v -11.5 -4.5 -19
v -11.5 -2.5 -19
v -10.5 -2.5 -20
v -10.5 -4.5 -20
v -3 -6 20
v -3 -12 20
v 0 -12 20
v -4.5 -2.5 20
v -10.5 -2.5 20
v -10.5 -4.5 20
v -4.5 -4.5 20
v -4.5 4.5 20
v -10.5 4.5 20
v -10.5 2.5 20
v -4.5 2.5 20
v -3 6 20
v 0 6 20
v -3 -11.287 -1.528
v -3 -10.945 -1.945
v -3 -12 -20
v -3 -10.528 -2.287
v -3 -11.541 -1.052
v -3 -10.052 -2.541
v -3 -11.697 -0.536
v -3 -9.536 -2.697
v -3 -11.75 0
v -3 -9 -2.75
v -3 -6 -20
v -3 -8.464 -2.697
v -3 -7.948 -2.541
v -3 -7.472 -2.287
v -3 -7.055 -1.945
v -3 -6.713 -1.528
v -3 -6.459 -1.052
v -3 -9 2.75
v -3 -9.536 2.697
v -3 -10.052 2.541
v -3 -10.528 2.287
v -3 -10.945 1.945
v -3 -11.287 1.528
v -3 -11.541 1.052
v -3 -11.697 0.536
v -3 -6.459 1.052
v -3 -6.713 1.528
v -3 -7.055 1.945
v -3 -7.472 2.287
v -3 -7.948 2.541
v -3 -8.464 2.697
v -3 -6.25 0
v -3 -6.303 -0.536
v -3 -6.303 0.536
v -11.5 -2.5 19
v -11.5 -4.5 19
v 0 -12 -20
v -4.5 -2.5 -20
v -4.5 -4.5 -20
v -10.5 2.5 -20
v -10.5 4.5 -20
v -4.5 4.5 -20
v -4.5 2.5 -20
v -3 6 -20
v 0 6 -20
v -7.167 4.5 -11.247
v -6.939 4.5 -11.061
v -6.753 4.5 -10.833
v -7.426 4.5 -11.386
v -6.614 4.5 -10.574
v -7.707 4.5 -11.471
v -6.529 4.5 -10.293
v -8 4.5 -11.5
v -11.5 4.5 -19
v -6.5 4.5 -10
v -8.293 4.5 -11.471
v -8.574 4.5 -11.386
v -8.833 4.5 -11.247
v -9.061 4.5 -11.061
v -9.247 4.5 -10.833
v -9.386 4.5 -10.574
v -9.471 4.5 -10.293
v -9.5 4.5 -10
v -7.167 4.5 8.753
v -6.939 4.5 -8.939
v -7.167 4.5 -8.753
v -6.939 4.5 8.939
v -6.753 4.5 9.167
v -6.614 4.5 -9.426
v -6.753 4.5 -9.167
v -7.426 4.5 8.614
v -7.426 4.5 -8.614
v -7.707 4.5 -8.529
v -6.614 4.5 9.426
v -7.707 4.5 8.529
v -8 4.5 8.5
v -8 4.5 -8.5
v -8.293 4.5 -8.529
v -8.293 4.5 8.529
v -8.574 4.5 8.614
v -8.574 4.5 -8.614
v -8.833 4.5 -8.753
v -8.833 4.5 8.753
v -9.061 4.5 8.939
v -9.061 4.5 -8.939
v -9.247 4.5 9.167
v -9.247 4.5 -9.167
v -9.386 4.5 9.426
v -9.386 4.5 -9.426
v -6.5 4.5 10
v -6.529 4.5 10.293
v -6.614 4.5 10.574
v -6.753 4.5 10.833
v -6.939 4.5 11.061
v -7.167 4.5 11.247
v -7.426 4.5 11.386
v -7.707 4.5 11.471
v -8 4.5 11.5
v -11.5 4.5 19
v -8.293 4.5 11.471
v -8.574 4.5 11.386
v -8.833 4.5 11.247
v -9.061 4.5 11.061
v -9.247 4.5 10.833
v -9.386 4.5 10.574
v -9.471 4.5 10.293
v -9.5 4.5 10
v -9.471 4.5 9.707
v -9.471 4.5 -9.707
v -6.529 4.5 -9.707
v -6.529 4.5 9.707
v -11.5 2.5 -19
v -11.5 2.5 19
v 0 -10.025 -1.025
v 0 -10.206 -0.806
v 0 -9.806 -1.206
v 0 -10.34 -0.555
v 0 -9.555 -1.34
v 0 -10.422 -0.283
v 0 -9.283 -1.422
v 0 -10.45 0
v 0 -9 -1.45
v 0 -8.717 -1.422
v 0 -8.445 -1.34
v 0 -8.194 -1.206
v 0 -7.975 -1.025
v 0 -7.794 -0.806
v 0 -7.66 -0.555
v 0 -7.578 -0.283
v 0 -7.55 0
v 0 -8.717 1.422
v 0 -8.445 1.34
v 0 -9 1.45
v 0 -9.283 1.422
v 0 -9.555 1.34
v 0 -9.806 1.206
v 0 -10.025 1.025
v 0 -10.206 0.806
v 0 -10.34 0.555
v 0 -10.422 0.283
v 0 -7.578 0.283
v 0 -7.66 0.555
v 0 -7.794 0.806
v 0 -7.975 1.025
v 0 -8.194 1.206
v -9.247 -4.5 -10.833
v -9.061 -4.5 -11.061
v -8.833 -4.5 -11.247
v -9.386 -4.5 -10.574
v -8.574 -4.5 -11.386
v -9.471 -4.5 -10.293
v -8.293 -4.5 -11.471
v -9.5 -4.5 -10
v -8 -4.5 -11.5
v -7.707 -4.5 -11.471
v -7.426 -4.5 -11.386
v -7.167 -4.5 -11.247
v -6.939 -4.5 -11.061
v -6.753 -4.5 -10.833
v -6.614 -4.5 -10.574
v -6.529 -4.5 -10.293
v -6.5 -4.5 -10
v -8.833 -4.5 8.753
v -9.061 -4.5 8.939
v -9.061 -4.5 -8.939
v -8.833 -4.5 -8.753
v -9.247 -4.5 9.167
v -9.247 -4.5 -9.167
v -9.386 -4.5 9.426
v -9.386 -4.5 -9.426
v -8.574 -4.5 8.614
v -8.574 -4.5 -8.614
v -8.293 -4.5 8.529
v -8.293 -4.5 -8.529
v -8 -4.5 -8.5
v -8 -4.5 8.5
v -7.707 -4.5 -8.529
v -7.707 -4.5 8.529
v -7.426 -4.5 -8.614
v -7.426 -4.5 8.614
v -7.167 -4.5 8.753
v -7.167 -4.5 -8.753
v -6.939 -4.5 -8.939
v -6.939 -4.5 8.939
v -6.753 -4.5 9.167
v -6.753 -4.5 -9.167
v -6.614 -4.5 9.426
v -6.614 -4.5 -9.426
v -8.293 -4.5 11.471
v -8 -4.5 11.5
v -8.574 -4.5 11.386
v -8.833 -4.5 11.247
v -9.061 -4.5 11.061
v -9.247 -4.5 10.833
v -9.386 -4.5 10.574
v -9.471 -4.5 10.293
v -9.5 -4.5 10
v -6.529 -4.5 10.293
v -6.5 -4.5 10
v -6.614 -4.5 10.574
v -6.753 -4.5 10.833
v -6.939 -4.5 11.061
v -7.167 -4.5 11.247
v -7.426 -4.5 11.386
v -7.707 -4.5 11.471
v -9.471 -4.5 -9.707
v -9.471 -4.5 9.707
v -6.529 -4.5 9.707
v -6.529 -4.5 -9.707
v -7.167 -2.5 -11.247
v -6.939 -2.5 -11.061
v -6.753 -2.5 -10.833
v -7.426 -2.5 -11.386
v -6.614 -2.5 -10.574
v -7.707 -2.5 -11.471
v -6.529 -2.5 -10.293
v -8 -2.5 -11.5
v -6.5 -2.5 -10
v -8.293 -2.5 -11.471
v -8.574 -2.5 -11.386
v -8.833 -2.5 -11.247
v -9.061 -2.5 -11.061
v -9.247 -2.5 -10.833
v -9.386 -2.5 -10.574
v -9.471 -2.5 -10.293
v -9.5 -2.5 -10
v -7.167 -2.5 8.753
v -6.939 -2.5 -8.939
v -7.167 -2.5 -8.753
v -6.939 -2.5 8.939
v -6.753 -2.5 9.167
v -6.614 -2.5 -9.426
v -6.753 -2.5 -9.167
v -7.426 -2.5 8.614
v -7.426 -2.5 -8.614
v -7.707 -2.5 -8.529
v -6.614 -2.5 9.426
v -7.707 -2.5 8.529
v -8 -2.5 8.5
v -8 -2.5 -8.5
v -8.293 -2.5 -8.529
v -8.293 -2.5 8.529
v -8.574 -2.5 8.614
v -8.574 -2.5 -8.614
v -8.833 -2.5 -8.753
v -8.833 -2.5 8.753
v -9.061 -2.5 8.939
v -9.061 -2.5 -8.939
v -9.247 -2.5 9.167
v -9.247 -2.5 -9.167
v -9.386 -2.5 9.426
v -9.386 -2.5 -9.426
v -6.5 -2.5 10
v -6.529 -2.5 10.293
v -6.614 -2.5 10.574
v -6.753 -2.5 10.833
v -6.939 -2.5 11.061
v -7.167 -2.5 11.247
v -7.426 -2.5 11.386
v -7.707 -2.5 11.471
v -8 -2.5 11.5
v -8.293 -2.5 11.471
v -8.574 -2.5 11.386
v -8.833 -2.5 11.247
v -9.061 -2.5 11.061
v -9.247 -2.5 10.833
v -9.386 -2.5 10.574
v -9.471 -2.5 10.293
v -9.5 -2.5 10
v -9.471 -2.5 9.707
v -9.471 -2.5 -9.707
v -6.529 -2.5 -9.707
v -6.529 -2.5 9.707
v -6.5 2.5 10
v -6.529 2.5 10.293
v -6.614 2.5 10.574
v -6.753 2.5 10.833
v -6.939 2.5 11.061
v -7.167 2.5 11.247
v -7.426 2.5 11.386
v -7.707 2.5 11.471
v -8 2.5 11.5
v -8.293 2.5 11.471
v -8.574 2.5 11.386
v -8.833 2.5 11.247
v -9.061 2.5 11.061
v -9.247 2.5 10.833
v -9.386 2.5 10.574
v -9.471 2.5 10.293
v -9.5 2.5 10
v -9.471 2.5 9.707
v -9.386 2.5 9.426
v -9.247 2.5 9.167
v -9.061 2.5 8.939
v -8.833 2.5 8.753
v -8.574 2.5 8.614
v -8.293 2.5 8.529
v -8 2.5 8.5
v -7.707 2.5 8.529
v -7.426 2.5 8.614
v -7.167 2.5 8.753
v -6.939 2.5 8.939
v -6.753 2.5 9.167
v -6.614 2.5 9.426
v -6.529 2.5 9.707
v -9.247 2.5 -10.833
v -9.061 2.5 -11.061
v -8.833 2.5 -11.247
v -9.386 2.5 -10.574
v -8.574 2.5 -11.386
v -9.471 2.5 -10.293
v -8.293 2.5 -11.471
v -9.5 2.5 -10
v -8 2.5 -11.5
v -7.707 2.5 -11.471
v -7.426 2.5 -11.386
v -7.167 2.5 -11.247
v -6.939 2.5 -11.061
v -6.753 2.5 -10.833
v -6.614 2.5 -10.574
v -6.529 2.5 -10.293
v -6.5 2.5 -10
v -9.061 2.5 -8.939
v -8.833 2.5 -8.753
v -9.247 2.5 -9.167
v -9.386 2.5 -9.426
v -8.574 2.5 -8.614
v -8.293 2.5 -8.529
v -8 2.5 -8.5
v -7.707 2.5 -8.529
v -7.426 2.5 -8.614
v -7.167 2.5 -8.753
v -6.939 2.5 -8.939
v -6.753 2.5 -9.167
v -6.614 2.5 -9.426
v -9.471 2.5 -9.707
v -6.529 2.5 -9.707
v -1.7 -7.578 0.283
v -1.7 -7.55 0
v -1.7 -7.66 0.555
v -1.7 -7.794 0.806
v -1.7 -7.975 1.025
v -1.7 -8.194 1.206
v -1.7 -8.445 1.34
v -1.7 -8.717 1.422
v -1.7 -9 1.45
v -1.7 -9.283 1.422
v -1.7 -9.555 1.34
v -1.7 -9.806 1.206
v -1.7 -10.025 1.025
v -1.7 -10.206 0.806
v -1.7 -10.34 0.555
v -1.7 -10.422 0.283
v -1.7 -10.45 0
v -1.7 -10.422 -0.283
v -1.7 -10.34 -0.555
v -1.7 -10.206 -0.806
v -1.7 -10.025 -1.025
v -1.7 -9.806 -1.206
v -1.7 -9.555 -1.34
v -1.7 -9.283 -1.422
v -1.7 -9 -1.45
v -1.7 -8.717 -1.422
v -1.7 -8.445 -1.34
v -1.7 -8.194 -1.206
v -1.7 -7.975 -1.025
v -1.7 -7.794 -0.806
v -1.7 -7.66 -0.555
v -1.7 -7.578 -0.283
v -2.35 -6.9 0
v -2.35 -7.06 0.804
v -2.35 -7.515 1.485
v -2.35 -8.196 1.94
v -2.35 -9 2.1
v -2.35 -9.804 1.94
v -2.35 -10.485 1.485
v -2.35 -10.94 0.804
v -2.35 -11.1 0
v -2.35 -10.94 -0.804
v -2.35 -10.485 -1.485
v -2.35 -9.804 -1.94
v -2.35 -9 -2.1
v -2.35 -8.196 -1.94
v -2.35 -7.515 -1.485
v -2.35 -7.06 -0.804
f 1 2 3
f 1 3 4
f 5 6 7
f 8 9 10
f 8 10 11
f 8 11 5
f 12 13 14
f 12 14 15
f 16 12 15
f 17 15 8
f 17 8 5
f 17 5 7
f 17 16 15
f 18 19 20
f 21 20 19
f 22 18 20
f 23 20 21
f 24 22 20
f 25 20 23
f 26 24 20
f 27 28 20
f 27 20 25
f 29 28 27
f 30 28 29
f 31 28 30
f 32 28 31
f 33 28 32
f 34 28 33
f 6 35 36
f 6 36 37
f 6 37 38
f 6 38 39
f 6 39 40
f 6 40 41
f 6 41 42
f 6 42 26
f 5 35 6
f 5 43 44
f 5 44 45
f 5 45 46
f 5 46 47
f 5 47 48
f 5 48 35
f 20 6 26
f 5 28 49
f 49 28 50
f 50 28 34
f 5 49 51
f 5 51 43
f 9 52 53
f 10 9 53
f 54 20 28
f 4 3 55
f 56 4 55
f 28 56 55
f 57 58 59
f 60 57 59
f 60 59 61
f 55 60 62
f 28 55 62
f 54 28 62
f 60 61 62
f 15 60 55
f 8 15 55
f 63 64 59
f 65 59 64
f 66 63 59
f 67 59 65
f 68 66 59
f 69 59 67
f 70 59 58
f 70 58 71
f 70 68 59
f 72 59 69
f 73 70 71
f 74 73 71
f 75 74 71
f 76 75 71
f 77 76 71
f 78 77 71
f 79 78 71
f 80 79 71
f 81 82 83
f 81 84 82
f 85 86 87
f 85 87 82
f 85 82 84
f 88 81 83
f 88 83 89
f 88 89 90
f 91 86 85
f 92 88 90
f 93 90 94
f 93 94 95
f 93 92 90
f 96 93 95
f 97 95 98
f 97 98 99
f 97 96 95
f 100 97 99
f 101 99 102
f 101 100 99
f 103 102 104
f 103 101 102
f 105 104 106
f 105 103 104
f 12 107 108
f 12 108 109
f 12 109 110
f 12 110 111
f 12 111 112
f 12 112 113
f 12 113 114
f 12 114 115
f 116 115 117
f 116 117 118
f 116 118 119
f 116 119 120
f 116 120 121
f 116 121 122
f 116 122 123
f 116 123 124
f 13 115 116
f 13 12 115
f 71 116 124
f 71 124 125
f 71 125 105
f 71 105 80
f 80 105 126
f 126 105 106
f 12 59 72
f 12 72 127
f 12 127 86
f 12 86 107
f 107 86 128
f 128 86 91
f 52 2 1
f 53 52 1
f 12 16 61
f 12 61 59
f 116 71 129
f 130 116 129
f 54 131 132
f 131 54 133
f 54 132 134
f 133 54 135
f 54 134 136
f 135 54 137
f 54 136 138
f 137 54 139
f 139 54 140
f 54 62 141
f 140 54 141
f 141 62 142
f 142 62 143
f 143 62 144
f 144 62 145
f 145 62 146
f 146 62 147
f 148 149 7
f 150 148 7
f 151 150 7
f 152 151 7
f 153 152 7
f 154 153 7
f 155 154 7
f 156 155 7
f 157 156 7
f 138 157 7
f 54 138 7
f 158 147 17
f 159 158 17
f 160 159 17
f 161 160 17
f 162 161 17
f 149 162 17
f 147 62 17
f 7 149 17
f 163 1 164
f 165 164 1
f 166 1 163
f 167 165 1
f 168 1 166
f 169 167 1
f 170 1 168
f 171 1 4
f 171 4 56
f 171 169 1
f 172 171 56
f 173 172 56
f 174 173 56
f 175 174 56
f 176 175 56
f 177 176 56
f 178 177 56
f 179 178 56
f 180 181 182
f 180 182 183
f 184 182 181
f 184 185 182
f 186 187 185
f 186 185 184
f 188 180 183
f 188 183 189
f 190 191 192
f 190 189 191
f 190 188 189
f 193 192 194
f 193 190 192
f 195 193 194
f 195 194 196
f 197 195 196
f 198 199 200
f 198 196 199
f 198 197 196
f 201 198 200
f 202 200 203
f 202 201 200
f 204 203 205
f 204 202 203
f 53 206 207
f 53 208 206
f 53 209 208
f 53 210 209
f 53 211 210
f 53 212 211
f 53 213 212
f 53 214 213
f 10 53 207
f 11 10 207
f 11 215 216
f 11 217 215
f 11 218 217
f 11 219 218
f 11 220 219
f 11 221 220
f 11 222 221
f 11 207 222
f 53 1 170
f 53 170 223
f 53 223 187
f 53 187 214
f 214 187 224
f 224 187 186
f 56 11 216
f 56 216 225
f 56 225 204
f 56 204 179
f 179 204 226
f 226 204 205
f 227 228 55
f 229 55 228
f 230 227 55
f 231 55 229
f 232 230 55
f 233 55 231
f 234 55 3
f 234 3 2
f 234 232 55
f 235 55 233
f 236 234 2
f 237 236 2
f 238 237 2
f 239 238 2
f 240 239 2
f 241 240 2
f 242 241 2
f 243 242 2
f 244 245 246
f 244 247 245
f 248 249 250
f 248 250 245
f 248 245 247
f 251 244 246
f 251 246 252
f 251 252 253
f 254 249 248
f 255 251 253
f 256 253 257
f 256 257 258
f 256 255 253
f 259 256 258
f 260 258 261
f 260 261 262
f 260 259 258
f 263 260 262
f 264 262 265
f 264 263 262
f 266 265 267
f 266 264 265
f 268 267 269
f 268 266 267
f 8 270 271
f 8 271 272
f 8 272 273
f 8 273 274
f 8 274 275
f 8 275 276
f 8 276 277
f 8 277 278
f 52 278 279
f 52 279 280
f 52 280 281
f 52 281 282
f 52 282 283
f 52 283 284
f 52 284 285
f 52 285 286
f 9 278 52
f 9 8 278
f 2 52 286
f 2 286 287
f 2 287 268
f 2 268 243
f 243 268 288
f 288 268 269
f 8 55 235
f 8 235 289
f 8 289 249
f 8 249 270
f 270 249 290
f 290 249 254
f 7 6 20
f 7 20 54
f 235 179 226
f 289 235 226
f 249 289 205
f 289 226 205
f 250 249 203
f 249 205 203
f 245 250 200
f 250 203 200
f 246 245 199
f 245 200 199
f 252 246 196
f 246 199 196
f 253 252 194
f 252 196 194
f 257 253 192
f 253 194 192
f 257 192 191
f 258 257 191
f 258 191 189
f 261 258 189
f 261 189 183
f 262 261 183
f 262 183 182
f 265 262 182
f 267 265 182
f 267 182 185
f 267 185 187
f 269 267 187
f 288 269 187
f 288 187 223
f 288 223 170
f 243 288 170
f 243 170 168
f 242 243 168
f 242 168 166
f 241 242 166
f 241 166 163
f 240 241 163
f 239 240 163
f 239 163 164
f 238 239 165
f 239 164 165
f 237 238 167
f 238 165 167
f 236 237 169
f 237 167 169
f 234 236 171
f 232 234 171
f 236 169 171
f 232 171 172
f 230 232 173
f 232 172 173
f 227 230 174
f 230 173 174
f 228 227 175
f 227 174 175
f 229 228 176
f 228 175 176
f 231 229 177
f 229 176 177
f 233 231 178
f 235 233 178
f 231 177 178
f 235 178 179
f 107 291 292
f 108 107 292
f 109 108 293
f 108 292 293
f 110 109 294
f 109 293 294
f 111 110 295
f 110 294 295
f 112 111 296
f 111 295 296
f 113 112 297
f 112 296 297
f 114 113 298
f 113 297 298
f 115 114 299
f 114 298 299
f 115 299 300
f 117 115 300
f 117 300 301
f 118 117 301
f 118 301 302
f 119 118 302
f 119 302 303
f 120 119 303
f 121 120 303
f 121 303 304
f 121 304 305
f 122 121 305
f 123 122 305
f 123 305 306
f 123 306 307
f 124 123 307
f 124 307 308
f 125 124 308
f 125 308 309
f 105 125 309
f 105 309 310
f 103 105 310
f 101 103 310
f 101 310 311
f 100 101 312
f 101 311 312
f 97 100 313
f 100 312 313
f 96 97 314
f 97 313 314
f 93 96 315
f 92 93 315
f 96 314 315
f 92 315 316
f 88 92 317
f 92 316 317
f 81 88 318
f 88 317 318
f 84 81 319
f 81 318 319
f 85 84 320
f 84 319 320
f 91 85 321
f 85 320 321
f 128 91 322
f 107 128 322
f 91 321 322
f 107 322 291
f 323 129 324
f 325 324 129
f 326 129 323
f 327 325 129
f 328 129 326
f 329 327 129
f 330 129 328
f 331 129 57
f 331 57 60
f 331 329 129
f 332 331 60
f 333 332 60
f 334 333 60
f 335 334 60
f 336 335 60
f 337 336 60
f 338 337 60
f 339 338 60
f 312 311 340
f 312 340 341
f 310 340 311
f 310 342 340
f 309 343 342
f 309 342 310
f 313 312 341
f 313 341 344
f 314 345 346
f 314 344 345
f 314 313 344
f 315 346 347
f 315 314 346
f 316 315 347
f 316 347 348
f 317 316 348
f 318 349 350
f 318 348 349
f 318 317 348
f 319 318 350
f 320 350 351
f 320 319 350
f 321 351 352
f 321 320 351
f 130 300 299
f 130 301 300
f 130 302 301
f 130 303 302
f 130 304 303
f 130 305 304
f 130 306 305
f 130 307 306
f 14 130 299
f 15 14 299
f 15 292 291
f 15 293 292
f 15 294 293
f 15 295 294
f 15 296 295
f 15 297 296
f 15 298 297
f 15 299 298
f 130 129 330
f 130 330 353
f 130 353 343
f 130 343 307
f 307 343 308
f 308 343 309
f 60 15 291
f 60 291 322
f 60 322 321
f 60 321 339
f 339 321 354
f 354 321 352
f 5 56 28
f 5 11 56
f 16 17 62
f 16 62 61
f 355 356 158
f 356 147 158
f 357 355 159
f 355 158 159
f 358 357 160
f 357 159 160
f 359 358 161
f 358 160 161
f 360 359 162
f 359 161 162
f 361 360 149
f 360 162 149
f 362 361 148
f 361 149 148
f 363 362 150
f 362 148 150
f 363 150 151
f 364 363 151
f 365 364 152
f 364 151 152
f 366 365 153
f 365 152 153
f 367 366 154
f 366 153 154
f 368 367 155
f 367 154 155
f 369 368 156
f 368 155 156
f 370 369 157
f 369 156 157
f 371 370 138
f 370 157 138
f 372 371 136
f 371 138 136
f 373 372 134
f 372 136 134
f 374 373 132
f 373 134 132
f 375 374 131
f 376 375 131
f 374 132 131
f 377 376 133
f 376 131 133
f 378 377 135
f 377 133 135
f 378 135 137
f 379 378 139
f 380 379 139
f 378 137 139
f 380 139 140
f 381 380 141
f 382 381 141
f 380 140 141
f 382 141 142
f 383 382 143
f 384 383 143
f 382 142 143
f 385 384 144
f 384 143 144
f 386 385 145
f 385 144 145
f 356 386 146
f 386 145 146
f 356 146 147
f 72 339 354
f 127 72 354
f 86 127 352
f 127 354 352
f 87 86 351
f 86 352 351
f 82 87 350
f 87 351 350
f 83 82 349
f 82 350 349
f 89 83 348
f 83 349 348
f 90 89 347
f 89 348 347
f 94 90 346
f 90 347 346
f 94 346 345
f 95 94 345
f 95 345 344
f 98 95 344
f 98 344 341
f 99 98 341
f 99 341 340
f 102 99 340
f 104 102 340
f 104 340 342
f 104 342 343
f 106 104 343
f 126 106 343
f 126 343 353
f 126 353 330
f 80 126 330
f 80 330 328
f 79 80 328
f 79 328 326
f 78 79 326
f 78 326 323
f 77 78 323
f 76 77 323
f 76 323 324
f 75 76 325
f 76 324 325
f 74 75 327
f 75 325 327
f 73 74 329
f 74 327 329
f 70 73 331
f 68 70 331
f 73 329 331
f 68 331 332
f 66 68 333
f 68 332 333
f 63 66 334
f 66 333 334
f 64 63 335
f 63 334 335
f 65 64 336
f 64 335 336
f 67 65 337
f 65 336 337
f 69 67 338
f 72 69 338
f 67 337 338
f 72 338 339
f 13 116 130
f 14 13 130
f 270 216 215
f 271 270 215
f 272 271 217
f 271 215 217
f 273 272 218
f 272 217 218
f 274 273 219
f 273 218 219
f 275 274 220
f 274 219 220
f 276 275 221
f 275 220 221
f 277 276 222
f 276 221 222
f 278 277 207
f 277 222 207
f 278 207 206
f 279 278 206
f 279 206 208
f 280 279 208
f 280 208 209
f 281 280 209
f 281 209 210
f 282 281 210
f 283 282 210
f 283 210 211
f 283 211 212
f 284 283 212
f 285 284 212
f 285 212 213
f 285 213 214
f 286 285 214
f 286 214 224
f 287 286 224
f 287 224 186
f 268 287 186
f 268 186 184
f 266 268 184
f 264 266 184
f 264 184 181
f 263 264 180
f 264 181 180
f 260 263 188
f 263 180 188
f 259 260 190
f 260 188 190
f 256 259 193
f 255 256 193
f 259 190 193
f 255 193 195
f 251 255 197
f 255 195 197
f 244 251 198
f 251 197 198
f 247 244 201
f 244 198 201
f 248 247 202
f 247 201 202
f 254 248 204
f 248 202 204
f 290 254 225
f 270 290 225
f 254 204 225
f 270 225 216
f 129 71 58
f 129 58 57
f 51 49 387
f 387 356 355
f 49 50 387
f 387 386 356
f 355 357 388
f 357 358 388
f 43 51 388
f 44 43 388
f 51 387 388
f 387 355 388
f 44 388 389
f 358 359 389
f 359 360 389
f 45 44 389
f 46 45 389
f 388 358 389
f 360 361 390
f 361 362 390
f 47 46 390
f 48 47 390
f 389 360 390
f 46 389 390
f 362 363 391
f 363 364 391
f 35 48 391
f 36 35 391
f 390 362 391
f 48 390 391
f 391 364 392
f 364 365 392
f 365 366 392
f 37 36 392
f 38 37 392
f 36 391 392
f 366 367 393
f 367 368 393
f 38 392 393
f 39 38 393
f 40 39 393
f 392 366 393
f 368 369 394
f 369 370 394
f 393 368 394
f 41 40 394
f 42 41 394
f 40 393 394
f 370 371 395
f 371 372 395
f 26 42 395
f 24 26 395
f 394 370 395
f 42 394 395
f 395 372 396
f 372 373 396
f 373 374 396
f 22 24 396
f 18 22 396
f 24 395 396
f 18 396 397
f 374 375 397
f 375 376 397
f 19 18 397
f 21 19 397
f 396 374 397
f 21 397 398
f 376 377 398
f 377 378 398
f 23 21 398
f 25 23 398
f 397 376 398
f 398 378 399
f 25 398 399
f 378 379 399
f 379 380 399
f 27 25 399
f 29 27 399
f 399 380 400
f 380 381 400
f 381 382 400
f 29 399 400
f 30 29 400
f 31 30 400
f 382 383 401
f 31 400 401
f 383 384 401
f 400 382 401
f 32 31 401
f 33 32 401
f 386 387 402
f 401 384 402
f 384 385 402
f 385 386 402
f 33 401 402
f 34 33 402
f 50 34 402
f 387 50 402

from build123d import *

# Parameters (mm, degrees)
SALIENTE_EXTRUIR1_DEPTH                              = 20
TALADRO_DE_MARGEN_PARA_M31_D                         = 3
CHAFL_N2_SIZE                                        = 1
CROQUIS4_W                                           = 3
CROQUIS4_H                                           = 40
SALIENTE_EXTRUIR2_DEPTH                              = 6
AVELLANADO_PARA_TORNILLO_CON_CABEZA_OVAL_D           = 2.9
AVELLANADO_PARA_TORNILLO_CON_CABEZA_OVAL_CSINK_D     = 5.5
AVELLANADO_PARA_TORNILLO_CON_CABEZA_OVAL_CSINK_ANGLE = 90


with BuildPart() as part:
    # Croquis1 → Saliente-Extruir1 (new, symmetric)
    with BuildSketch(Plane(origin=(0, 0, 0), x_dir=(0, 1, 0), z_dir=(0, 0, 1))):
        Polygon((-6, 0), (6, 0), (6, 3), (4.5, 4.5), (4.5, 11.5), (2.5, 11.5), (2.5, 4.5), (-2.5, 4.5), (-2.5, 11.5), (-4.5, 11.5), (-4.5, 4.5), (-6, 3), align=None)
    extrude(amount=SALIENTE_EXTRUIR1_DEPTH, both=True)

    # Taladro de margen para M31 (through all)
    with Locations(Plane(origin=(0, 4.5, 0), x_dir=(-1, 0, 0), z_dir=(0, 1, 0))):
        with Locations((8, -10), (8, 10)):
            Hole(TALADRO_DE_MARGEN_PARA_M31_D / 2)

    # Chaflán2
    chafl_n2_edges = [part.edges().sort_by_distance(p)[0] for p in [
        (-11.5, -3.5, -20),
        (-11.5, 3.5, -20),
        (-11.5, 3.5, 20),
        (-11.5, -3.5, 20),
    ]]
    chamfer(chafl_n2_edges, length=CHAFL_N2_SIZE)

    # Croquis4 → Saliente-Extruir2 (add)
    with BuildSketch(Plane.XZ.offset(6)):
        with Locations((-1.5, 0)):
            Rectangle(CROQUIS4_W, CROQUIS4_H)
    extrude(amount=SALIENTE_EXTRUIR2_DEPTH)

    # Avellanado para tornillo con cabeza ovalada de M2.51 (through all)
    with Locations(Plane(origin=(-3, 0, 0), x_dir=(0, -1, 0), z_dir=(-1, 0, 0))):
        with Locations((9, 0)):
            CounterSinkHole(AVELLANADO_PARA_TORNILLO_CON_CABEZA_OVAL_D / 2, AVELLANADO_PARA_TORNILLO_CON_CABEZA_OVAL_CSINK_D / 2, counter_sink_angle=AVELLANADO_PARA_TORNILLO_CON_CABEZA_OVAL_CSINK_ANGLE)


solid = part.part
